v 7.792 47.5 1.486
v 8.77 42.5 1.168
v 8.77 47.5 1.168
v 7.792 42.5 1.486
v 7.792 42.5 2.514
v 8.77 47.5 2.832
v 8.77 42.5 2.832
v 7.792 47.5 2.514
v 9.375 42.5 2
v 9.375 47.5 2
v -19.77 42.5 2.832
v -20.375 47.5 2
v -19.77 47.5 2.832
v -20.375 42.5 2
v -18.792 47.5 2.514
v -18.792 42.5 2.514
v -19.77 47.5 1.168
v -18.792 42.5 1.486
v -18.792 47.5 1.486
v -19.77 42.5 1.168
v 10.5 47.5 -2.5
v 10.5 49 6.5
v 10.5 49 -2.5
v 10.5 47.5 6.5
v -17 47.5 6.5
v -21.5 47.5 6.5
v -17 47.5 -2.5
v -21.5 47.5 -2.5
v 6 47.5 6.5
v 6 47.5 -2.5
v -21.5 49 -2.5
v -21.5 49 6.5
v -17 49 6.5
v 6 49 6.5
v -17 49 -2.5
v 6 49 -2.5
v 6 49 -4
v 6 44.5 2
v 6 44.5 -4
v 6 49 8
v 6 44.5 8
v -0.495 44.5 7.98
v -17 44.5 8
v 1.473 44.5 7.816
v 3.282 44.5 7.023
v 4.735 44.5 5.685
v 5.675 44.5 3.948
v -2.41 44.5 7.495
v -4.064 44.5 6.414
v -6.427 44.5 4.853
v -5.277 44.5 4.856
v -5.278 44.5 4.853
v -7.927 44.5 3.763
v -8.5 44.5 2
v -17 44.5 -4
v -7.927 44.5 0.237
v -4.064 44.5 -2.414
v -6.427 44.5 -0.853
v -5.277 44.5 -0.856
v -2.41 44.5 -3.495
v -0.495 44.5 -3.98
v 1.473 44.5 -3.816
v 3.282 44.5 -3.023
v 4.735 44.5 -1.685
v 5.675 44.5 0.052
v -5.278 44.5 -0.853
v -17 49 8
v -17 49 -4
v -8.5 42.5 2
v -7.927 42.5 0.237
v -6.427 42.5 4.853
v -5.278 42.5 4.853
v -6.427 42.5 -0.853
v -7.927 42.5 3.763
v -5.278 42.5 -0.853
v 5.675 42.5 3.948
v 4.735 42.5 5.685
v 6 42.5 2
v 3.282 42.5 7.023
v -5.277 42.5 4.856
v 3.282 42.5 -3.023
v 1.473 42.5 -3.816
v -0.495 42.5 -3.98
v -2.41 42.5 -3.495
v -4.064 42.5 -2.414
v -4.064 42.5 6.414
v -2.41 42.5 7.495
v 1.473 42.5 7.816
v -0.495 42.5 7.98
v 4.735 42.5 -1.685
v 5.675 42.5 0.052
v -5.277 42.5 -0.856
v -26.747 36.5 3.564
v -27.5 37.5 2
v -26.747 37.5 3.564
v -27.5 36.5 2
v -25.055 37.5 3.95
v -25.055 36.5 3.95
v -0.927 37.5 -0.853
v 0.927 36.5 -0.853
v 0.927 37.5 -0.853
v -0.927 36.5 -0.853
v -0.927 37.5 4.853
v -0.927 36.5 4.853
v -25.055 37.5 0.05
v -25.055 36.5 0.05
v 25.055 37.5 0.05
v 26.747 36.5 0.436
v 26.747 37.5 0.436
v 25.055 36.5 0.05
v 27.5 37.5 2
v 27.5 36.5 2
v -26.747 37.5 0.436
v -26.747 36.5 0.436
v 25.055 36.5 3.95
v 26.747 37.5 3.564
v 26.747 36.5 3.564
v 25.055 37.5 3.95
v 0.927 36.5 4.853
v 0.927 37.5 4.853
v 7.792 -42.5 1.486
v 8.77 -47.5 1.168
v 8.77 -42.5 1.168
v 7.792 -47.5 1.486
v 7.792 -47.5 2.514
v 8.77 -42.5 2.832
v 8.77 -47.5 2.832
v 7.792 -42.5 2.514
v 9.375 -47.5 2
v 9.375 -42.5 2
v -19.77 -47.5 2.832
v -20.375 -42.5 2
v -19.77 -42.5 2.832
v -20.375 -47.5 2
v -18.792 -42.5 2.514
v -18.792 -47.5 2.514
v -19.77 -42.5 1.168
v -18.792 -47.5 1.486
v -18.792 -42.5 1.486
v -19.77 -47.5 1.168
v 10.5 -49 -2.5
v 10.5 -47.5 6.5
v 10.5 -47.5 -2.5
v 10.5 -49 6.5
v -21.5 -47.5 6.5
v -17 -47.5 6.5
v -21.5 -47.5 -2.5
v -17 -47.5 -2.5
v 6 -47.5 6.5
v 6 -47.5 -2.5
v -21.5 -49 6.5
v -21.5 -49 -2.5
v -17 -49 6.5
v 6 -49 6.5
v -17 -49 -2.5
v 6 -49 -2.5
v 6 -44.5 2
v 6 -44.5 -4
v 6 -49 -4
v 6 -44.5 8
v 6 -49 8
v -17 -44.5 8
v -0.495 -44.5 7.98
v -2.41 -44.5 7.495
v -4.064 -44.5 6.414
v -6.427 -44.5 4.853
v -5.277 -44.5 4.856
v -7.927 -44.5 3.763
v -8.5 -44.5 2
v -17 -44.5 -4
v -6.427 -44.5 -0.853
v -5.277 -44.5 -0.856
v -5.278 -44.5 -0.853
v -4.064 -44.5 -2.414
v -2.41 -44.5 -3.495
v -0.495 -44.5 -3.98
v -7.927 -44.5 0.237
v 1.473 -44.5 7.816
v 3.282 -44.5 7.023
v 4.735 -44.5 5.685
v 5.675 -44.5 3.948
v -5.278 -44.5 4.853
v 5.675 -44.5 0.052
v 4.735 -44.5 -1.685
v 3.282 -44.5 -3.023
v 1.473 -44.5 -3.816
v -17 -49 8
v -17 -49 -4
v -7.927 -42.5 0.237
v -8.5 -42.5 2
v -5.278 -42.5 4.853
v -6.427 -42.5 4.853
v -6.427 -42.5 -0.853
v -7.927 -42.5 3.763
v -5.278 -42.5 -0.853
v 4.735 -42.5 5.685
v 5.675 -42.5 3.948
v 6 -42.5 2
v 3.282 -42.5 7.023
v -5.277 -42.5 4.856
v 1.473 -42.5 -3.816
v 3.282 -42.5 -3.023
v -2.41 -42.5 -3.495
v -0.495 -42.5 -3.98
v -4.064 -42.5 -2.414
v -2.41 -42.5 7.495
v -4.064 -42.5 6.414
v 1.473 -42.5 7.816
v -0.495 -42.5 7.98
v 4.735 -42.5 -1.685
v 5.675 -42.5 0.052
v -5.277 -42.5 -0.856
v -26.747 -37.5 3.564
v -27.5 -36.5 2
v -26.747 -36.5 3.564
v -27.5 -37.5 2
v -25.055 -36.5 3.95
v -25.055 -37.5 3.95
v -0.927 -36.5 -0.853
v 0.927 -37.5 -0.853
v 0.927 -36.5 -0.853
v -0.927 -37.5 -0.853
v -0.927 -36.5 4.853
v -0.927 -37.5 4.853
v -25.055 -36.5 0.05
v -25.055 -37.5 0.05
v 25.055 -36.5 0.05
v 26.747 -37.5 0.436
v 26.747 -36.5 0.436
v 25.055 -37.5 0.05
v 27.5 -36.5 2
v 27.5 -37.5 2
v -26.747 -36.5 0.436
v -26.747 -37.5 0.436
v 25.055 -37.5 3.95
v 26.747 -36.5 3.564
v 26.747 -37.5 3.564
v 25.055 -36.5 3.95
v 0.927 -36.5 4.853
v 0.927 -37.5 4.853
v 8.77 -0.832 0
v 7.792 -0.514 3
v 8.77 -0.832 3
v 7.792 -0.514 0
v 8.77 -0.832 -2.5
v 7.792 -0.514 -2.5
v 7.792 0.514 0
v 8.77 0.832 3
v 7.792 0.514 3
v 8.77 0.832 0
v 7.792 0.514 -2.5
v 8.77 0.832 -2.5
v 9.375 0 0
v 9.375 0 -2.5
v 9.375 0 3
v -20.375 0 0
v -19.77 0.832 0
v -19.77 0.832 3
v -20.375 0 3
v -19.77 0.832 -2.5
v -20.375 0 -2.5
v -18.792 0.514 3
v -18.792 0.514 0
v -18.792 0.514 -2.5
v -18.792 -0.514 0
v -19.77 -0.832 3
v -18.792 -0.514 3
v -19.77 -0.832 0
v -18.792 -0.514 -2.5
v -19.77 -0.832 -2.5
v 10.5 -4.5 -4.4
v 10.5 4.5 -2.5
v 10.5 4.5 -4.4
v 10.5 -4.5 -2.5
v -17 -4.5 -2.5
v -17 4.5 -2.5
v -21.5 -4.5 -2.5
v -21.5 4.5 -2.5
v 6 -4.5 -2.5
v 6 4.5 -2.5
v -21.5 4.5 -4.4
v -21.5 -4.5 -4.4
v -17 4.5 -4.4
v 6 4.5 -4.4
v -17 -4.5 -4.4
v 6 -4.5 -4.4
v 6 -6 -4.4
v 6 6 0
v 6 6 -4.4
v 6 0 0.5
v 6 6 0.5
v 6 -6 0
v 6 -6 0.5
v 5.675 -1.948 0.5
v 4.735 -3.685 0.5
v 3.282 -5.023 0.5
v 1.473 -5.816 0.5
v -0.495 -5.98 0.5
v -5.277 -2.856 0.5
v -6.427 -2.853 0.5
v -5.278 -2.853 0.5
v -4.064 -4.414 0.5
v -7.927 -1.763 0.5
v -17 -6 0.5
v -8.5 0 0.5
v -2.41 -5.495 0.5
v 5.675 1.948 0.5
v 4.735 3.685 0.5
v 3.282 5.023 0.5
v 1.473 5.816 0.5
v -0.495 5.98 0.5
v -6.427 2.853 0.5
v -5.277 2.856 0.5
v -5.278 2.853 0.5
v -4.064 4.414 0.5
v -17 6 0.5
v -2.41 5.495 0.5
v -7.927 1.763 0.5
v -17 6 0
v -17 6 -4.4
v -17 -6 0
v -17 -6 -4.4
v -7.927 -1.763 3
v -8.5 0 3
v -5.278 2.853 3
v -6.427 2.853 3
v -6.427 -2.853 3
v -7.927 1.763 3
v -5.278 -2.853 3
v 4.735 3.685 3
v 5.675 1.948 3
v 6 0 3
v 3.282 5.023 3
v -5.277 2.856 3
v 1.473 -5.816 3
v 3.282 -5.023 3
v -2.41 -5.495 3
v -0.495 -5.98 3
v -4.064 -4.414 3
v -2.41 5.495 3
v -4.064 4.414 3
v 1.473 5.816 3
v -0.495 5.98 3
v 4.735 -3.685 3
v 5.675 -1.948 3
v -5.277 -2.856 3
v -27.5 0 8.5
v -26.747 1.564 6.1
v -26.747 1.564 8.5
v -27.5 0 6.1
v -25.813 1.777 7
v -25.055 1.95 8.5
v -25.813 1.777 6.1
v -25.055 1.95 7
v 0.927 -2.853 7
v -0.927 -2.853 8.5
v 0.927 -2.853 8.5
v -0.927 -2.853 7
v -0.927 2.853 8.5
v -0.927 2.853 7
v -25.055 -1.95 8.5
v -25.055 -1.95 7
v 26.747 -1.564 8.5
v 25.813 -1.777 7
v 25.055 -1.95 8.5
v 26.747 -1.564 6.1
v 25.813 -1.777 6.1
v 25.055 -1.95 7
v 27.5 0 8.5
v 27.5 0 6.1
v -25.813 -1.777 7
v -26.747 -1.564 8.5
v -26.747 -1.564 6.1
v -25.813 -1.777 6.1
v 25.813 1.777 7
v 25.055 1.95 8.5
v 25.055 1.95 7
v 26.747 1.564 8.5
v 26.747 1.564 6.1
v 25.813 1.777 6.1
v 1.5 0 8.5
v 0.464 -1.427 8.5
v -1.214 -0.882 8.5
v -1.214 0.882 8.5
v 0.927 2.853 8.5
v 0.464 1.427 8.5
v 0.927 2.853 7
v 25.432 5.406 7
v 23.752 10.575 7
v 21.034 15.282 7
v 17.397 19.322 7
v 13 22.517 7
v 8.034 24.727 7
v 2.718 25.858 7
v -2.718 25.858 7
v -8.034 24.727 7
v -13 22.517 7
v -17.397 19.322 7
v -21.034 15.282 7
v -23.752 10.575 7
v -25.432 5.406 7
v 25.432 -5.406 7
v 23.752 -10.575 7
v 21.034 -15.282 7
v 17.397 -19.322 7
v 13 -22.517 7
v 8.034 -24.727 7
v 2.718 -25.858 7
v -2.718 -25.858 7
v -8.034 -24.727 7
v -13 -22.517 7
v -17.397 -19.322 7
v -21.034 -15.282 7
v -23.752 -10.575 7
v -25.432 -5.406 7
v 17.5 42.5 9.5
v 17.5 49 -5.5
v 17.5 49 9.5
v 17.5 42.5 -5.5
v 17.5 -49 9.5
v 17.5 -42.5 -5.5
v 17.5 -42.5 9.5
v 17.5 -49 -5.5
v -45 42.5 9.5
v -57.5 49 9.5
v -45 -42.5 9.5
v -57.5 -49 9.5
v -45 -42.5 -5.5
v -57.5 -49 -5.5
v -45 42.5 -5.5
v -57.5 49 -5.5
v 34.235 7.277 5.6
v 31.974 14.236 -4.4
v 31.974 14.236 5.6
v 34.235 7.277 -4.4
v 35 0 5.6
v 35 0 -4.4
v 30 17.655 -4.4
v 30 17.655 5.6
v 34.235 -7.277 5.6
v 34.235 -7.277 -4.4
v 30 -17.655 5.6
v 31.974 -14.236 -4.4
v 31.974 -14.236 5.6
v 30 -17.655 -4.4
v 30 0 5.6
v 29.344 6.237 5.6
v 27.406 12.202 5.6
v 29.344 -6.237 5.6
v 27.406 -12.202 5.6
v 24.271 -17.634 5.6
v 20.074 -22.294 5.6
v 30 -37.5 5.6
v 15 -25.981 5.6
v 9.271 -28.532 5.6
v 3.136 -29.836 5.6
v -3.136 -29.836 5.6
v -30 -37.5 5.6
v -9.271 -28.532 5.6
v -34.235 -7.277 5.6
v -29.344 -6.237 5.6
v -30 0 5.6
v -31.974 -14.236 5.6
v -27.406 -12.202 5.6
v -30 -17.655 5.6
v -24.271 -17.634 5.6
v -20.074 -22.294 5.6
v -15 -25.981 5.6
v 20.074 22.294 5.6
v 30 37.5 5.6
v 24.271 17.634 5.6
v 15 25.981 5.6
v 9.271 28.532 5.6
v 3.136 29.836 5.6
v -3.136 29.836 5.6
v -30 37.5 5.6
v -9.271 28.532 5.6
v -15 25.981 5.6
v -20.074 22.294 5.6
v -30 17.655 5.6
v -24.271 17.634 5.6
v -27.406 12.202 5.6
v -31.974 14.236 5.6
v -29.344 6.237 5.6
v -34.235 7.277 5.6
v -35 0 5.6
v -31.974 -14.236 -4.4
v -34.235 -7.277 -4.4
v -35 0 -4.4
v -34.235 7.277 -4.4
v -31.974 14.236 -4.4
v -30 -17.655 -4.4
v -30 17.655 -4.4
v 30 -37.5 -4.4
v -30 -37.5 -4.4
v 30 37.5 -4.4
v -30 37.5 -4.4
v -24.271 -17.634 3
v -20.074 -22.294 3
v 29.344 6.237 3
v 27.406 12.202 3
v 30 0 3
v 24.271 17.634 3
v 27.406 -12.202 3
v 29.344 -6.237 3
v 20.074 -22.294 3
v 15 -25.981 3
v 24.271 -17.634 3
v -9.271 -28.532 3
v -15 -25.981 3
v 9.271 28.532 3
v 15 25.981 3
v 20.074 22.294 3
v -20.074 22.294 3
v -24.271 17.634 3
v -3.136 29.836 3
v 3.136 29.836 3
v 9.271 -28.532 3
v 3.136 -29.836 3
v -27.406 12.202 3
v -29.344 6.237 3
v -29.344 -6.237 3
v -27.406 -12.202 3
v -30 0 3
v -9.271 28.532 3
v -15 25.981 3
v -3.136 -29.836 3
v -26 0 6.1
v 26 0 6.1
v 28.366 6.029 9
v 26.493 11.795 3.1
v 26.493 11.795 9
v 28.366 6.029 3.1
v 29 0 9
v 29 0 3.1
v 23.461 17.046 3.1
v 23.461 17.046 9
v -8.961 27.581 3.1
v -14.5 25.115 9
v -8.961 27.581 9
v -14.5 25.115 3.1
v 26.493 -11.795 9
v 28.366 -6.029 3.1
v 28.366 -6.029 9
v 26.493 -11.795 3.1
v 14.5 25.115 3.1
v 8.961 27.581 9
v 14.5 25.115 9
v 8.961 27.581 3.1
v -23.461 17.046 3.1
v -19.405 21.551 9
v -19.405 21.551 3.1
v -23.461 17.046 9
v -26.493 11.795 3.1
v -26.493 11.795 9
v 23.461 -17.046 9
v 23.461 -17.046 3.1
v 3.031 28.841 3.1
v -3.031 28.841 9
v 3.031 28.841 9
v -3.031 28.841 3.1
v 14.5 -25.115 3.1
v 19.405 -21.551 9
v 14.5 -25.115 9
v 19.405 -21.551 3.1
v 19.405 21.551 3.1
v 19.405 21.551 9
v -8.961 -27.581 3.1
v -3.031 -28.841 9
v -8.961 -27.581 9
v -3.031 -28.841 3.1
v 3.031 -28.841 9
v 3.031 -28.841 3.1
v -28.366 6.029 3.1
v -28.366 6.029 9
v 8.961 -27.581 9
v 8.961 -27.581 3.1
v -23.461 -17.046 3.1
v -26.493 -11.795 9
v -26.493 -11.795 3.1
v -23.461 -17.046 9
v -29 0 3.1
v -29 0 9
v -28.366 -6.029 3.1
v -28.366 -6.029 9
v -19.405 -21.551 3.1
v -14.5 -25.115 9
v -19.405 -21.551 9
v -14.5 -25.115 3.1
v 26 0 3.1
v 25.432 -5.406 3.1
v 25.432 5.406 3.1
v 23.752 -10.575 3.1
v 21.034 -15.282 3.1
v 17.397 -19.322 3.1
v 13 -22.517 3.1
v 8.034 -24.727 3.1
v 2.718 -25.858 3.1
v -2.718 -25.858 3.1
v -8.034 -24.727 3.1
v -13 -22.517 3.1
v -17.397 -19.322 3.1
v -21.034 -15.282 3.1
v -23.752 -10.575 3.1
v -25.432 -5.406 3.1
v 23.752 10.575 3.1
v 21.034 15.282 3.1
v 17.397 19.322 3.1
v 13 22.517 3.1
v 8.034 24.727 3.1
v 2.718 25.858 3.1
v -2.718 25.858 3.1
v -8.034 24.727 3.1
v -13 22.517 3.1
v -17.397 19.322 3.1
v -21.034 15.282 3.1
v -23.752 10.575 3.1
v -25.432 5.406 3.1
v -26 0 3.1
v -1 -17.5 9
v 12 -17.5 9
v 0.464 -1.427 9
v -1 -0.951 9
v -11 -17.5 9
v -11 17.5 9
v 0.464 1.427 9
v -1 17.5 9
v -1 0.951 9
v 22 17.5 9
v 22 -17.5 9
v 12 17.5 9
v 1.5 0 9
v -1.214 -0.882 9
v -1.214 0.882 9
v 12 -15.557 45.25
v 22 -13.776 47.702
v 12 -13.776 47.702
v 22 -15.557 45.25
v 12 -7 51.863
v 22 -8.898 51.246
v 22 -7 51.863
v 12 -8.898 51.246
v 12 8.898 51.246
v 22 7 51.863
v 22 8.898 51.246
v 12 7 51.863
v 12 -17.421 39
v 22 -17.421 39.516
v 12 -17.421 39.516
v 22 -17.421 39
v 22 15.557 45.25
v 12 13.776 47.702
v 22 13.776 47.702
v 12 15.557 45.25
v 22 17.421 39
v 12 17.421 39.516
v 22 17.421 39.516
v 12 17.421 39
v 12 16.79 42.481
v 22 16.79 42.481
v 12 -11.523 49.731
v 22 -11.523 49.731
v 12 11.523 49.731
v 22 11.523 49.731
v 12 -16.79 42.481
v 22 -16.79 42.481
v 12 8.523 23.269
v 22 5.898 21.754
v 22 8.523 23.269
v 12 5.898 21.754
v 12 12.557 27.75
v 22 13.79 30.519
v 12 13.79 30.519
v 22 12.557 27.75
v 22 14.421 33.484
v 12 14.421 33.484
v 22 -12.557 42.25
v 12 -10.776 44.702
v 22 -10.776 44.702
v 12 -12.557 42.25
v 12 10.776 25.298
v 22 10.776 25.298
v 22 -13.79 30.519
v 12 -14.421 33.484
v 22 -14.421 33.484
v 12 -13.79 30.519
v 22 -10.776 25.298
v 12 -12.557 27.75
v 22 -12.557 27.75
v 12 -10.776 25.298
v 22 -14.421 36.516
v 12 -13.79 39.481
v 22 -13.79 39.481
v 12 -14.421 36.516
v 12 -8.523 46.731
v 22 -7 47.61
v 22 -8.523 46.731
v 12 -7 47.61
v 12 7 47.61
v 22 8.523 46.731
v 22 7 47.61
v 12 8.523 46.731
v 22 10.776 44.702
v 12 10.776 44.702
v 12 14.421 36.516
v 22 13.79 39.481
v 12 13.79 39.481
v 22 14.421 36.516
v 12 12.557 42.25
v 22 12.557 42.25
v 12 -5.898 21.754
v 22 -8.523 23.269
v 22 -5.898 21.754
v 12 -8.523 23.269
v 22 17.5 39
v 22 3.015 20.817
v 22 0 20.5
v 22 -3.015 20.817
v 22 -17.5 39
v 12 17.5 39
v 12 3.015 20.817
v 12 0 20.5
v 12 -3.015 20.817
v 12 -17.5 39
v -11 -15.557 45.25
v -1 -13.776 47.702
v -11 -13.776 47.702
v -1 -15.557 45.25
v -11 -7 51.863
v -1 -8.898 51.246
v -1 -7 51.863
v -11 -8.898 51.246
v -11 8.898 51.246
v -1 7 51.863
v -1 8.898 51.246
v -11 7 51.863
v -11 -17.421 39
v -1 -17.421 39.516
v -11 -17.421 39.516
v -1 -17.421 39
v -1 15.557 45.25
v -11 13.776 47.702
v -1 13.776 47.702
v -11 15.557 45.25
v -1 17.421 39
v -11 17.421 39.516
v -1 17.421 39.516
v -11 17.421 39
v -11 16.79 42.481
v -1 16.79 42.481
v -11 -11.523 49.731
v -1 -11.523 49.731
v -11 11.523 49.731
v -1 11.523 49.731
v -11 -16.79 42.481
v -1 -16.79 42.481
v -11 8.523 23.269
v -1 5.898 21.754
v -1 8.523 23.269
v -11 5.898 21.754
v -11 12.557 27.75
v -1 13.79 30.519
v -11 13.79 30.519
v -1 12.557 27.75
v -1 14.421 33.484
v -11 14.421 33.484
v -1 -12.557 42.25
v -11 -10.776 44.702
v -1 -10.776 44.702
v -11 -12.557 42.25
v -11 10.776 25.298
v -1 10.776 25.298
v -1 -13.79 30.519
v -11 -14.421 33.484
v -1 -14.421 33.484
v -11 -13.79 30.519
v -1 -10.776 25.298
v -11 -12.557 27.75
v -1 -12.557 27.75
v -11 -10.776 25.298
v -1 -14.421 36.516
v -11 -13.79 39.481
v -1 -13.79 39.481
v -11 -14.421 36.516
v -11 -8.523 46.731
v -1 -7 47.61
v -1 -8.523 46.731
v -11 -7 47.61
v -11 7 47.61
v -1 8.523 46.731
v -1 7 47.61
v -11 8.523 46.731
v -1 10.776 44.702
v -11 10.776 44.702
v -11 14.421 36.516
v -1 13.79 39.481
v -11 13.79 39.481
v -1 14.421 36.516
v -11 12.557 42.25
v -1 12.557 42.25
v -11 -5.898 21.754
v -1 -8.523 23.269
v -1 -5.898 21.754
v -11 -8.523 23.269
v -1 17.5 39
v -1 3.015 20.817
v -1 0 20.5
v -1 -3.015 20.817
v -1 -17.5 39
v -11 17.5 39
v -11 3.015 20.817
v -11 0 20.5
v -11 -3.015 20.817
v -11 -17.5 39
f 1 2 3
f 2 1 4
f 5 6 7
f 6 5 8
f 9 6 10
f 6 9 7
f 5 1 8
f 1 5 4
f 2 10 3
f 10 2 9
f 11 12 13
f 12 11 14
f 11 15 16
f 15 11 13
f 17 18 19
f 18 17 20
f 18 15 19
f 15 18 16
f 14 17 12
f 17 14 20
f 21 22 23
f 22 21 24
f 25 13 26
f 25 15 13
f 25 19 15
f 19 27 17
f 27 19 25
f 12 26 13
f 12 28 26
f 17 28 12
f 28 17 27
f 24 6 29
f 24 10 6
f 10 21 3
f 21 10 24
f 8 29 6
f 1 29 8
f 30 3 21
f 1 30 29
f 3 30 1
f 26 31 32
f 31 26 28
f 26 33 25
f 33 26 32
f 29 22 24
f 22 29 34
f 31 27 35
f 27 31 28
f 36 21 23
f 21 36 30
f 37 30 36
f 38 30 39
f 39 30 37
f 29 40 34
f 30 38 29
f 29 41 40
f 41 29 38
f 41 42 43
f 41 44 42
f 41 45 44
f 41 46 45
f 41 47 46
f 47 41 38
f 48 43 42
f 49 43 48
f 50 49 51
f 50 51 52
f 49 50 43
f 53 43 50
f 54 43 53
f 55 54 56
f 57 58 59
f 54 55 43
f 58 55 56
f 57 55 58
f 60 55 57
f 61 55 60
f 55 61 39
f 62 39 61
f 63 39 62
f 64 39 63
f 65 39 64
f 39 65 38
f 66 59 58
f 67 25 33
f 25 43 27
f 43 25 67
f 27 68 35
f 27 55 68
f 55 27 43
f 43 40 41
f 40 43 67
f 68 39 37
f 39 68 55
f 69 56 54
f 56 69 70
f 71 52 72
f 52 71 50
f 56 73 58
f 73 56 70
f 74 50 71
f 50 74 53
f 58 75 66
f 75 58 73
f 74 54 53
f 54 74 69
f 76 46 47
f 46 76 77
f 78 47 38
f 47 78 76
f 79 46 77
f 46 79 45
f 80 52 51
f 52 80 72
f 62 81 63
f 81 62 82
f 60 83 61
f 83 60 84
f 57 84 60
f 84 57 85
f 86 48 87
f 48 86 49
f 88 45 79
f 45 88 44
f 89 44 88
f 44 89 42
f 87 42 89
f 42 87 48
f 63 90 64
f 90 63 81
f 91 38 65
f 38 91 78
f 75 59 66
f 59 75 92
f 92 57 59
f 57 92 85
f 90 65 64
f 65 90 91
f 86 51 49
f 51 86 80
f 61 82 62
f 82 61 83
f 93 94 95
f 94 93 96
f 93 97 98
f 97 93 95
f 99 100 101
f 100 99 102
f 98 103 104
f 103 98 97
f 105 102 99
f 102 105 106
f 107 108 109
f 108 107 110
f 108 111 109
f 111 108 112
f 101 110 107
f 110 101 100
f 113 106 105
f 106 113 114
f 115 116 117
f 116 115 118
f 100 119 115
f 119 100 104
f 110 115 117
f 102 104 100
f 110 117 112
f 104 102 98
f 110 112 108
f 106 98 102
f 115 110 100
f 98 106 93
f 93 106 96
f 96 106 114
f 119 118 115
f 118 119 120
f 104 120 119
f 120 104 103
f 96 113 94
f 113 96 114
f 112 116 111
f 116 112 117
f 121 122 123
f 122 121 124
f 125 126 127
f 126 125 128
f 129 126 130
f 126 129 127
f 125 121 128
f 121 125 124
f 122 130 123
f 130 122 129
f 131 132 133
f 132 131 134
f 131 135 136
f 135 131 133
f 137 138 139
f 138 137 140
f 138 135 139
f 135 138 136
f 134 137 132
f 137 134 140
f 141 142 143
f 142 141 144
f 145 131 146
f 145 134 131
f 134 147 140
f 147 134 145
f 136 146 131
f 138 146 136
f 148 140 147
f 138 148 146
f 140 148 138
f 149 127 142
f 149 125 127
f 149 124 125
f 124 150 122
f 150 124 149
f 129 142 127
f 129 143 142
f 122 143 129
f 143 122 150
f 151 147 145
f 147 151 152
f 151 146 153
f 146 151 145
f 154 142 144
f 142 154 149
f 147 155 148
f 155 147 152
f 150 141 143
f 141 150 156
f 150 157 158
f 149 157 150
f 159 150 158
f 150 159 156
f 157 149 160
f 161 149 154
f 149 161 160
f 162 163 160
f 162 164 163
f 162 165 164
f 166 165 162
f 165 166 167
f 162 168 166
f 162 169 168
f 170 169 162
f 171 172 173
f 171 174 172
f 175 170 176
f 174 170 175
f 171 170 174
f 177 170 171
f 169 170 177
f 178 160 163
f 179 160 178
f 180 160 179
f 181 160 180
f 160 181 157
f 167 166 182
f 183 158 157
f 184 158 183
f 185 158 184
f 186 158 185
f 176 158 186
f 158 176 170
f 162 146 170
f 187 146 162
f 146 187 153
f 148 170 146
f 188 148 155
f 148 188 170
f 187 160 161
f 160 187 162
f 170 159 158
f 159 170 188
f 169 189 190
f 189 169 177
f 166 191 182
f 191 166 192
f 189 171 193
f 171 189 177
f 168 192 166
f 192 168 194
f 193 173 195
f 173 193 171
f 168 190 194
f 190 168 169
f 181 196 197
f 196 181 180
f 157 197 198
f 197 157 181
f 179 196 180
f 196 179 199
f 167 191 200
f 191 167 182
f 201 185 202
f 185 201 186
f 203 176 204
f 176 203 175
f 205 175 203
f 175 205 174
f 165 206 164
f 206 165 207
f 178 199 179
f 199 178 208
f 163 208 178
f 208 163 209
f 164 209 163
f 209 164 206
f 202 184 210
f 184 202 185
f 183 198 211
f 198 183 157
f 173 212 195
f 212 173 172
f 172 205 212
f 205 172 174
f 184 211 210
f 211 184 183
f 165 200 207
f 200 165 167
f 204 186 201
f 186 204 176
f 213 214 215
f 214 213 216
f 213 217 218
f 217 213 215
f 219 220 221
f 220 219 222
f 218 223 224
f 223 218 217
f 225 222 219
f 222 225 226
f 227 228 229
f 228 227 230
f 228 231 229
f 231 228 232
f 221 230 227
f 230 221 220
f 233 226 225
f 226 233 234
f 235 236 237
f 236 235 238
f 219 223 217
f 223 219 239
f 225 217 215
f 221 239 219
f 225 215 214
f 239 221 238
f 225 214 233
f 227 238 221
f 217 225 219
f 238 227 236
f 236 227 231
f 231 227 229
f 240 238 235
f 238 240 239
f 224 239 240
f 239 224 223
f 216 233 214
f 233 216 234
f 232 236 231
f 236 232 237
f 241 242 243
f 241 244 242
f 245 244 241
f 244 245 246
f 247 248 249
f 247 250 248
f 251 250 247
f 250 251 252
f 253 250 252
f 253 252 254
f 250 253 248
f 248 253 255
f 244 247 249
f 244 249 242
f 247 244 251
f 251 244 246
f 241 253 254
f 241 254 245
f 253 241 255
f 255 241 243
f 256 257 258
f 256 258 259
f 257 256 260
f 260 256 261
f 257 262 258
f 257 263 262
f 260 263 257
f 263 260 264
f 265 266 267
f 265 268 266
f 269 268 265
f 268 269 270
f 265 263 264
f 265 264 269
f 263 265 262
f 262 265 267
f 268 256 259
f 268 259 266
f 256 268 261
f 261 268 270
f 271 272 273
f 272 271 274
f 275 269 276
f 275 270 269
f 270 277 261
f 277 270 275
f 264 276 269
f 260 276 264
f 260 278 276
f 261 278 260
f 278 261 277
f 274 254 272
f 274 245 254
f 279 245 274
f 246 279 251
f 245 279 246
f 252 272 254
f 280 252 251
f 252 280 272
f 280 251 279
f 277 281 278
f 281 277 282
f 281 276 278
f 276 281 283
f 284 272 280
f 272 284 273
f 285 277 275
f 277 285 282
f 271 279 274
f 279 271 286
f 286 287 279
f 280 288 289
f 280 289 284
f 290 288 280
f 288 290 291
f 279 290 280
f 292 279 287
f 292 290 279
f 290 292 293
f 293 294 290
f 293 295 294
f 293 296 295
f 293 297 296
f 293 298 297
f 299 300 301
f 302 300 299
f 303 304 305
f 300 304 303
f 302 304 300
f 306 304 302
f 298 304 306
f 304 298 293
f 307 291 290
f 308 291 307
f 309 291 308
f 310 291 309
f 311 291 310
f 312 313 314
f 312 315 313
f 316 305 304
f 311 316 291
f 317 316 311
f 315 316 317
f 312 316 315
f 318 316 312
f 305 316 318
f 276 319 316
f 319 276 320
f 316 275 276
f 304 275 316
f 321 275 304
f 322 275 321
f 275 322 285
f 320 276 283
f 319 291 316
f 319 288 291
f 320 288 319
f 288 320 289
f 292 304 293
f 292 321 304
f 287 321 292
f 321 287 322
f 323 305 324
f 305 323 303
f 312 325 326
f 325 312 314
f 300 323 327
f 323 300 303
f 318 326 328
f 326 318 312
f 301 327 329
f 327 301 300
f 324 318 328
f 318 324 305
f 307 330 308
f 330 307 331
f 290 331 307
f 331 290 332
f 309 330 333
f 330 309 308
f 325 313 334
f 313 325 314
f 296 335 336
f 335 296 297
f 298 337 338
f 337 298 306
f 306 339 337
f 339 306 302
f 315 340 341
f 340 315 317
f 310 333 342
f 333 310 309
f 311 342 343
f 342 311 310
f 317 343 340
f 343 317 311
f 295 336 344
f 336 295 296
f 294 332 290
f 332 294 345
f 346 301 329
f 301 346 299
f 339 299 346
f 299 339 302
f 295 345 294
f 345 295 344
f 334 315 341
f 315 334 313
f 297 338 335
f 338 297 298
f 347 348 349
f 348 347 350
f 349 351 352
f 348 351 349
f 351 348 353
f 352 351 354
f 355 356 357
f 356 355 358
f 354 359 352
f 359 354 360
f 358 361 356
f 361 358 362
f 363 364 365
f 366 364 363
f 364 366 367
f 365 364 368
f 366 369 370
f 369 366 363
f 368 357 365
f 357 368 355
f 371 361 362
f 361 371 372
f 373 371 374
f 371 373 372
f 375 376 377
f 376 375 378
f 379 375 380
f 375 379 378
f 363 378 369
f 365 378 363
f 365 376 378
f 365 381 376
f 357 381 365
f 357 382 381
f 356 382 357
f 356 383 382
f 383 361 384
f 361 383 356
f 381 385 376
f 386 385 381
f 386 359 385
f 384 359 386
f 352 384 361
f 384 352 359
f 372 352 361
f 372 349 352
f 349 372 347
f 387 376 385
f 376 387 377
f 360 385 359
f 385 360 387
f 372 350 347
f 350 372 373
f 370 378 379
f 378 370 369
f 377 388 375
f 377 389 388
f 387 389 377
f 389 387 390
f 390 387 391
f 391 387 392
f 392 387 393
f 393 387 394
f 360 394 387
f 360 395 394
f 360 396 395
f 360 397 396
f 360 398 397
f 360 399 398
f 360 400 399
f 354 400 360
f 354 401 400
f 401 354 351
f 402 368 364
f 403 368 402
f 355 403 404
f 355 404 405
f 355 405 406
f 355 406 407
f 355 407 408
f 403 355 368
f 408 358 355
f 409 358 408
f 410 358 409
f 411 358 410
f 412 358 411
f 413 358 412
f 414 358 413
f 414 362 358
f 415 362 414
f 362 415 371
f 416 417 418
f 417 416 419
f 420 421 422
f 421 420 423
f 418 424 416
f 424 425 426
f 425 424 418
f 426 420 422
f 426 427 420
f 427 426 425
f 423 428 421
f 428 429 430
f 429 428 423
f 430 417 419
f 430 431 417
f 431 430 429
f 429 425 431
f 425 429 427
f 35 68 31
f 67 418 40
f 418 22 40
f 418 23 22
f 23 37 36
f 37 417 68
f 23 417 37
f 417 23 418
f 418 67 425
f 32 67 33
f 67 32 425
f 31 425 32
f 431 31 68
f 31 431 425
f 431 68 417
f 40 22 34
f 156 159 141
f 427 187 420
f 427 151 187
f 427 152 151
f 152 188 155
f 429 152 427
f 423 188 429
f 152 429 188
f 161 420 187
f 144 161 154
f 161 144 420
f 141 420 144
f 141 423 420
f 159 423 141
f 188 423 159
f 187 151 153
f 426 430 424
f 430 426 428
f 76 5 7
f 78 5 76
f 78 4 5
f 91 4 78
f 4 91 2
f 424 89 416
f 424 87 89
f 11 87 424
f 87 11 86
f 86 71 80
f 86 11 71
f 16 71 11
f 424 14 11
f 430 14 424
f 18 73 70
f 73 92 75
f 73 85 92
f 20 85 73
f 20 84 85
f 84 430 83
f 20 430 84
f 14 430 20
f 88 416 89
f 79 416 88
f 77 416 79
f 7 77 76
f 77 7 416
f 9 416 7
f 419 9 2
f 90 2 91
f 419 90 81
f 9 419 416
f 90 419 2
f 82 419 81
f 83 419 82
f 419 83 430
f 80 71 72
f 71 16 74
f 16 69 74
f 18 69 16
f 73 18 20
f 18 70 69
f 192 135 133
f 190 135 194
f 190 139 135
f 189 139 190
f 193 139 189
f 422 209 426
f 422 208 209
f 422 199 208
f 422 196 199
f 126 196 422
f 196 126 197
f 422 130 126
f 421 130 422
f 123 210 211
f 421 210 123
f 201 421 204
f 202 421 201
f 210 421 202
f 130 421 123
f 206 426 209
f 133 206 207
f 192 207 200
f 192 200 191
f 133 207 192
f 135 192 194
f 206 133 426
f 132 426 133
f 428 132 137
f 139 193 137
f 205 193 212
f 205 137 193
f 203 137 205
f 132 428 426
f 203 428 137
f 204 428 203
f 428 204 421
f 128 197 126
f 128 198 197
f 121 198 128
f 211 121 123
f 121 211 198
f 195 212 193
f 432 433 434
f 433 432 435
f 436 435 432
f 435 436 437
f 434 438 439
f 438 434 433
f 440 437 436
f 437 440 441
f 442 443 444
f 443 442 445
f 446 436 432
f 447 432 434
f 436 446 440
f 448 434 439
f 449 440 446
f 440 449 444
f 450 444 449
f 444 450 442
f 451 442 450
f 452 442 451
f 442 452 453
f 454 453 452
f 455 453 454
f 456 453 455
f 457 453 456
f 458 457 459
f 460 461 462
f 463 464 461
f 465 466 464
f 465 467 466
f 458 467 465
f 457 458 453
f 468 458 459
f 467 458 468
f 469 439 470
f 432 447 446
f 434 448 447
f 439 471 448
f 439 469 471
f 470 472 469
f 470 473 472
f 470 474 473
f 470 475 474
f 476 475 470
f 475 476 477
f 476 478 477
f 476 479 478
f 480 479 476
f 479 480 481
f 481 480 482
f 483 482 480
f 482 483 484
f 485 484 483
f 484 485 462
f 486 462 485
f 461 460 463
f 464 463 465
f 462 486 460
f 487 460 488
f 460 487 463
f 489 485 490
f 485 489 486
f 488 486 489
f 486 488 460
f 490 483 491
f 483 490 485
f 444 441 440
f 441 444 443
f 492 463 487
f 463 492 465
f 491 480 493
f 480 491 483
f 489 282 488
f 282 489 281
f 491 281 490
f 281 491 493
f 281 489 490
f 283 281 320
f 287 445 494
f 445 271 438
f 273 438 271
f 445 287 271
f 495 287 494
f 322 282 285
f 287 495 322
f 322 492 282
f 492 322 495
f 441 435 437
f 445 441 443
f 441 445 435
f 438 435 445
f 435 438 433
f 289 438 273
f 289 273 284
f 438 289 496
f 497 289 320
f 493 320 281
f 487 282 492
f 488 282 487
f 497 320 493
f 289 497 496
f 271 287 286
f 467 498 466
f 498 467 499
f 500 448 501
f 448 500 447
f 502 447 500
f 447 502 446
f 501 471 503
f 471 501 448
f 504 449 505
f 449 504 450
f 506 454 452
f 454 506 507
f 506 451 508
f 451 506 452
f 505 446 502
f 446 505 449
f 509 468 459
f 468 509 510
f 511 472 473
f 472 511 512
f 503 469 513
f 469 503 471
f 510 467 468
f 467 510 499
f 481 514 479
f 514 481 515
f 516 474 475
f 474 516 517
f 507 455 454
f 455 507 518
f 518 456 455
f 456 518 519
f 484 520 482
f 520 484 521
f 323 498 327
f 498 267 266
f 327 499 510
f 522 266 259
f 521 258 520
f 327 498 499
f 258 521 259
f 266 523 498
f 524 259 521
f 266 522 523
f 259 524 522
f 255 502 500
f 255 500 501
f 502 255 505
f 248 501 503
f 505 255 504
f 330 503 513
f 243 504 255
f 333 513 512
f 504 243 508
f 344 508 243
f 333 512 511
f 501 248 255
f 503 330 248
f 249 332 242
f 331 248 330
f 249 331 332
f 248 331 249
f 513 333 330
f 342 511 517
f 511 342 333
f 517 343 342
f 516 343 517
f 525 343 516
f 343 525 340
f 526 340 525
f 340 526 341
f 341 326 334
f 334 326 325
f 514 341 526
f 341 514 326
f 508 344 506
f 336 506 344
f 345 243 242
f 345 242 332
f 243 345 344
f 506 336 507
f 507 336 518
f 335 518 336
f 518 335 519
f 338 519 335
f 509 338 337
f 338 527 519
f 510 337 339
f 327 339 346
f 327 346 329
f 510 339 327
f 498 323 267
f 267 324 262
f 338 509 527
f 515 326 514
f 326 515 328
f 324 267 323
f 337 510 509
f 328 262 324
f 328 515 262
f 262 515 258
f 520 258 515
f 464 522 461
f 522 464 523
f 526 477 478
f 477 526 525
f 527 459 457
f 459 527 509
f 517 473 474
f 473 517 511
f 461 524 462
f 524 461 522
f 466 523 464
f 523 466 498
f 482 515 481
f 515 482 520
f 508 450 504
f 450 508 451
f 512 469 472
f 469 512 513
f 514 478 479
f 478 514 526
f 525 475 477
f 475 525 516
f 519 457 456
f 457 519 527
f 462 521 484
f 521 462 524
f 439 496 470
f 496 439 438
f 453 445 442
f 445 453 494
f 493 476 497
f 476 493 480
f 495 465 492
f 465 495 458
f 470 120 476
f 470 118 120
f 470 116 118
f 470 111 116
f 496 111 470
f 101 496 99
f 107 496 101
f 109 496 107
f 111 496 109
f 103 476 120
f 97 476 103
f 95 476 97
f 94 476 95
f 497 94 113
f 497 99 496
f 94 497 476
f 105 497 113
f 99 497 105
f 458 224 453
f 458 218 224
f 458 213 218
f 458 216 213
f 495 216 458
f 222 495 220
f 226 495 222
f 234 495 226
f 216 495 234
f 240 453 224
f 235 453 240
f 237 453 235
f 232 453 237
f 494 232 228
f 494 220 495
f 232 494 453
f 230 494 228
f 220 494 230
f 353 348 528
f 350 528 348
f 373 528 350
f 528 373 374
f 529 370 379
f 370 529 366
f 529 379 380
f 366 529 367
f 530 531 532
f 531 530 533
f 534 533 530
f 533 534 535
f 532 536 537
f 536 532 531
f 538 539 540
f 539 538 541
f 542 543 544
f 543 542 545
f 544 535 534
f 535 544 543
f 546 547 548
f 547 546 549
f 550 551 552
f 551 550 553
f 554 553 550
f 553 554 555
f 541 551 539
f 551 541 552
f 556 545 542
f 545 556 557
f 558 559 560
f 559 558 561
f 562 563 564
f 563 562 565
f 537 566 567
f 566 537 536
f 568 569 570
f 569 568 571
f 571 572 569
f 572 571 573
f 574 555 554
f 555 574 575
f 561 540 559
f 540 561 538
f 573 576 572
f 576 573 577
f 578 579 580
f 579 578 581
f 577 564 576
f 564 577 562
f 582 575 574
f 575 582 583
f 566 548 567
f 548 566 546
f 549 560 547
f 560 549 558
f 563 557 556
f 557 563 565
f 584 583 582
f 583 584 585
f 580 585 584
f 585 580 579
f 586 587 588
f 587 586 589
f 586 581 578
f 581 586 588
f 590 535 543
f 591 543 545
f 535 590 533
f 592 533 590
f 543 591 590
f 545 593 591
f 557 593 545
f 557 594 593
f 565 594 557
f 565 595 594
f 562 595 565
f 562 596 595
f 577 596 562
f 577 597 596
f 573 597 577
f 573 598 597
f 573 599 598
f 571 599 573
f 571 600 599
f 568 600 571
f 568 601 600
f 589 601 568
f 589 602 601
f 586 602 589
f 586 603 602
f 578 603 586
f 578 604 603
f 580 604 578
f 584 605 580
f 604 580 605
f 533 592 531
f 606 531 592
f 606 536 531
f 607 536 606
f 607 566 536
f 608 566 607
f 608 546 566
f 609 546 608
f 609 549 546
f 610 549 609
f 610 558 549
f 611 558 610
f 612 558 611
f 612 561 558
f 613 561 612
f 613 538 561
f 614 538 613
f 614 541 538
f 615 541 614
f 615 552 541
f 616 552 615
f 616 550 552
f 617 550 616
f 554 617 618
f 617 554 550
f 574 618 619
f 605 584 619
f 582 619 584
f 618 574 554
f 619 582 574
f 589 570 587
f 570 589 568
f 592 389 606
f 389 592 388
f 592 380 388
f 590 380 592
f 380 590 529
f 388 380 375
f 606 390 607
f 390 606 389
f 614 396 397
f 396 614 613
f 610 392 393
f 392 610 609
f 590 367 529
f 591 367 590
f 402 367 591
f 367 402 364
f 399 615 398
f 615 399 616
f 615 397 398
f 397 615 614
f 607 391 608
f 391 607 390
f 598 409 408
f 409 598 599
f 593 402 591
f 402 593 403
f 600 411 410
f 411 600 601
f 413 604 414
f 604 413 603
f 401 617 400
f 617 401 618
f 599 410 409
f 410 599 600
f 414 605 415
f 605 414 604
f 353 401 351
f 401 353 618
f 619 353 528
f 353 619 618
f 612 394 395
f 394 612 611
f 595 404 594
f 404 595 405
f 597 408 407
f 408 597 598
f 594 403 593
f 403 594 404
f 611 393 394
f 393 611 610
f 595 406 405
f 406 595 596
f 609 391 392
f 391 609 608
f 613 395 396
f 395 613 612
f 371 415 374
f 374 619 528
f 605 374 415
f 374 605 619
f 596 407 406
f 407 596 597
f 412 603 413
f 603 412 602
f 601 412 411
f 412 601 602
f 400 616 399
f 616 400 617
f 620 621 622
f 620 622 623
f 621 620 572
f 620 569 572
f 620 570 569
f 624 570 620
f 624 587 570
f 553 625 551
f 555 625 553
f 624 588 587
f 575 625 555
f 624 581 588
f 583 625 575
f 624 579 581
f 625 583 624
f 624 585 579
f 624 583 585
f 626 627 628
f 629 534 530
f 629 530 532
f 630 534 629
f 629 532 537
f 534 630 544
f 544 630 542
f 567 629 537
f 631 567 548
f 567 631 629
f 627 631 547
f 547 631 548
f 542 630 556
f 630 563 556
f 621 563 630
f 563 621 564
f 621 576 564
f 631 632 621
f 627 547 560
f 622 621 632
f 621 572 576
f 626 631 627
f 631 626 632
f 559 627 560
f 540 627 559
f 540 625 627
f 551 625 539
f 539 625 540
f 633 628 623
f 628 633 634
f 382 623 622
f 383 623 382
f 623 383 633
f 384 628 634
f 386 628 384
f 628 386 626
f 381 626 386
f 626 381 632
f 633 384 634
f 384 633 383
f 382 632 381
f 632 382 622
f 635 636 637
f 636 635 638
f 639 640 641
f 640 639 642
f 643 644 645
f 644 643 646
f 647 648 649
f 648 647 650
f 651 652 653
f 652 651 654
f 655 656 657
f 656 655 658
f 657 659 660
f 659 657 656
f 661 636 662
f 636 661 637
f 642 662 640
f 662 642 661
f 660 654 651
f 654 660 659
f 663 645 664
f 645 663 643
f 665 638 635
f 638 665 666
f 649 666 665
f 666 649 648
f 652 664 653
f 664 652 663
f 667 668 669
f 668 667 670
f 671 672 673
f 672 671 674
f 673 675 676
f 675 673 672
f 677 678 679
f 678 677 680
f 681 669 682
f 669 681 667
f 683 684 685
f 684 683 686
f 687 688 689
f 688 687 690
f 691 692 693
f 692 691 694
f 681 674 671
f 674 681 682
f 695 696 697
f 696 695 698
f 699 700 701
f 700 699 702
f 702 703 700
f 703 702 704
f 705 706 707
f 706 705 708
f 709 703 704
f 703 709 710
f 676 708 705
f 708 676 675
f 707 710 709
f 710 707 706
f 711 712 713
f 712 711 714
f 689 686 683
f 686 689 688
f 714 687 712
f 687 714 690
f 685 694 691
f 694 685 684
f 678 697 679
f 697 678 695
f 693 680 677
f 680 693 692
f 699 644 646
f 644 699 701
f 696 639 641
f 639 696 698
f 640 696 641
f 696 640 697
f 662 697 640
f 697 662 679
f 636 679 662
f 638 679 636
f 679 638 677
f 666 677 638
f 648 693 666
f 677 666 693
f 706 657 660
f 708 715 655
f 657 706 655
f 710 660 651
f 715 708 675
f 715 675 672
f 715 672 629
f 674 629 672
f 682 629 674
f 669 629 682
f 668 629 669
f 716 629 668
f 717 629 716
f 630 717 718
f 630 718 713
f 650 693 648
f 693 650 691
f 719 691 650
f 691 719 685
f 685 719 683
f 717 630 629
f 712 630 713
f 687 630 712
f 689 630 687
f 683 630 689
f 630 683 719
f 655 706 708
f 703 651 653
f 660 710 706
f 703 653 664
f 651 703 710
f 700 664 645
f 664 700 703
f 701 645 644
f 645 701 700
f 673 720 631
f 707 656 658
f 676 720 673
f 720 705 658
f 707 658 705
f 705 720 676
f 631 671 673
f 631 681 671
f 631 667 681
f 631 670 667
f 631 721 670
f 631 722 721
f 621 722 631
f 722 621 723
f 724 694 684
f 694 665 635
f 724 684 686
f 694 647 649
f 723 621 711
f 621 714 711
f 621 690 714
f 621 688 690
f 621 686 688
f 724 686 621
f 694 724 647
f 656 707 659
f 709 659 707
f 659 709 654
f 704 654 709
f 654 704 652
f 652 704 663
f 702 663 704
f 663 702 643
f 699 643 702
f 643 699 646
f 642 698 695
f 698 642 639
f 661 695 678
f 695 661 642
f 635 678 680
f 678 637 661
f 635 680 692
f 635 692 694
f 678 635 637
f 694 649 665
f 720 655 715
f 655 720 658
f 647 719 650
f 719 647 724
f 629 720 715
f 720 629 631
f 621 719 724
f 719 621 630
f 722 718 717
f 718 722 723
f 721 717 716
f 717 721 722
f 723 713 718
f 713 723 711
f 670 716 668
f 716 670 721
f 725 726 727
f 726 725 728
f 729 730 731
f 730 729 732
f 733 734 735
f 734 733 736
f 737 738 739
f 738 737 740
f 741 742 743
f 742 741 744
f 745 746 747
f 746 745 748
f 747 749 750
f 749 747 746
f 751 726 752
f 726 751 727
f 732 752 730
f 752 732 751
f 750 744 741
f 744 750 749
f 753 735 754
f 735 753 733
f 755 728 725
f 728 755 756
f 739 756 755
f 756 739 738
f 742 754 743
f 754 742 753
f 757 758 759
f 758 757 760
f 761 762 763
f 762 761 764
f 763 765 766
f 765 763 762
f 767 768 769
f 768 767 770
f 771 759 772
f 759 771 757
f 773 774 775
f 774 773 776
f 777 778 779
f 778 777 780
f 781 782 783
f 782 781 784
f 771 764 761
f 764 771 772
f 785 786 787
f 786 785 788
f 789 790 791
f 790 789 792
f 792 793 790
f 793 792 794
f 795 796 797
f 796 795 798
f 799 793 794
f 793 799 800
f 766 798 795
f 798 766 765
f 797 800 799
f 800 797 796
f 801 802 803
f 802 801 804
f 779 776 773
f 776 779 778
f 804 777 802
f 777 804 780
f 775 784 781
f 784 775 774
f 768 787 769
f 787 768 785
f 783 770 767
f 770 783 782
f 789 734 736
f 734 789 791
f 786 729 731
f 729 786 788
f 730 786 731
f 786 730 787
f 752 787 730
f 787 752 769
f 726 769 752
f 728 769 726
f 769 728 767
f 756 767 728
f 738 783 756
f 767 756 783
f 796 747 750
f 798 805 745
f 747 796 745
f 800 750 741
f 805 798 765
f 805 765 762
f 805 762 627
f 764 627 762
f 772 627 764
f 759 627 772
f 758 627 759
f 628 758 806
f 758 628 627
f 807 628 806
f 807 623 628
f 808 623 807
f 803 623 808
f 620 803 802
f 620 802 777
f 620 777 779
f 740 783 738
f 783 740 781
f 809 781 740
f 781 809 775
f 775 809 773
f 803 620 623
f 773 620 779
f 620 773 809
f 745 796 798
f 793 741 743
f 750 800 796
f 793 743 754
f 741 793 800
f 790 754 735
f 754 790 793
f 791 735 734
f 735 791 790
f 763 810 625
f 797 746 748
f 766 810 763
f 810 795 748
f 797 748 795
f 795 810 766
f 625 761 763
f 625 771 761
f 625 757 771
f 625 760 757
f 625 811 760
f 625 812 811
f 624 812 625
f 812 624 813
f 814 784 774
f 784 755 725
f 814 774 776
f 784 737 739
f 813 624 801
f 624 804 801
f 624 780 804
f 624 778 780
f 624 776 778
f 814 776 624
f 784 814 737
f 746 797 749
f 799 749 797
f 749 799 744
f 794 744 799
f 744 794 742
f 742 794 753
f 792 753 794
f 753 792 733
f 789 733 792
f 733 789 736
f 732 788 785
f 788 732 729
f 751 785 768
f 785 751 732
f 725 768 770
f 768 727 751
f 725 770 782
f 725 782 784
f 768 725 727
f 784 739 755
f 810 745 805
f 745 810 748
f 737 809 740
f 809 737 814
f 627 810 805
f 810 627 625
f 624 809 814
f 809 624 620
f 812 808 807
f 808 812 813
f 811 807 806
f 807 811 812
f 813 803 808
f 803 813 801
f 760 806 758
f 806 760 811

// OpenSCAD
// file: utils.scad
module clone_mirror(axis) {
    children();
    mirror(axis)
    children();
}

module clone_translate(axis) {
    children();
    translate(axis)
    children();
}
// file: servo_utils.scad
use <utils.scad>

$servo_draglift_offset = 5.5;

function get_servo_draglift_offset() = $servo_draglift_offset;

module draglift() {
    color("white") {
        hull() {
            cylinder(1.5,3,3);
            clone_mirror([1,0,0]) translate([25.5,0,0]) cylinder(1.5,2,2);
        }
        mirror([0,0,1]) cylinder(2.5,3,3);
    }
}

module draglift_holder() {
    difference() {
        union() {
            cube([30, 5, 2]);
            clone_mirror([1,0,0]) clone_mirror([0,1,0])
                cube([30, 5, 2]);
        }
        draglift();
    }
}

module draglift_holder_aligned_to_servo() {
    translate([$servo_draglift_offset,0,17]) draglift_holder();
}

//draglift_holder();

module servo_screws() {
    color("gray") clone_mirror([1,0,0]) translate([14,0,6]) 
        cylinder(20,1.75/2,1.75/2, center=true);
}
servo_screws();

module servo(draw_draglift=true, draglift_angle=0) {
    color("blue") {
        cube([23,12,21], center=true);
        difference() {
            translate([0,0,6.5]) cube([32,9,2], center=true);
            servo_screws();
        }
        translate([0,0,10.5]) cylinder(3.5, 3, 3);
        translate([0,0,14]) cylinder(1,1,1);
    }
    translate([$servo_draglift_offset,0,10.5]) {
        color("blue") cylinder(3.5,6,6);
        color("white") cylinder(6,1.8,1.8);
    }
    if (draw_draglift)
        translate([$servo_draglift_offset,0,17]) rotate([0,0,draglift_angle]) draglift();
}

servo();
// main file
use <servo_utils.scad>;
use <utils.scad>

module camera_holder_servos() {
    clone_mirror([0,1,0]) 
        translate([-get_servo_draglift_offset(),55,2]) 
        rotate([90,0,0]) {
            servo(true, 0);            
            servo_screws();
        }
    translate([-get_servo_draglift_offset(),0,-10]) {
        servo();
        servo_screws();
    }
}

module camera_holder_sides() {
    difference() {
        translate([-20,0,2]) 
            cube([75,98,15], center=true);
        
        cube([90,85,30], center=true);
        camera_holder_servos();
    }
} 
camera_holder_sides();

module camera_holder_low() {
    difference() {
        union() {
            translate([0,0,-4.4]) cylinder(10,35,35);
            translate([-get_servo_draglift_offset(),0,-1.9]) 
                cube([35,15,5], center=true);
        }
        translate([0,0,3]) cylinder(3.1,30,30);    
        camera_holder_servos();
    }
    
    difference() {
        translate([0,0,0.6]) cube([60,75,10], center=true);
        cylinder(6,35,35);
        camera_holder_servos();
    }
}
camera_holder_low();

module camera_holder_up() {
    
    translate([0,0,3.1]) difference() {
        cylinder(6-0.1,29,29);
        translate([0,0,-0.1]) cylinder(7,26,26);                
        translate([0,0,4]) draglift();  
        translate([0,0,3]) draglift();  
    }
    difference() {
        translate([0,0,7]) cylinder(2,29,29);
        cylinder(50,1.5,1.5);
        camera_holder_servos();        
        translate([0,0,6]) draglift();
    }
    
    clone_translate([-23,0,0]) {
        intersection() {
            translate([17,0,34]) 
                cube([10,35,50], center=true);
            difference() {
                minkowski() {
                    camera();
                    cube(6, center=true);
                }
                camera();                
                cube([100,14,200], center=true);
            }
        }          
        difference() {
            translate([17,0,24]) cube([10,35,30], center=true);
            camera();
        }
    }
    
}
camera_holder_up();


module camera() {
    translate([15,0,35]) rotate([0,90,0]) 
        cylinder(55,29/2,29/2, center=true);
}
if ($preview) {
    color("gray", 0.7) camera();
    camera_holder_servos();
}

module camera_holder(servos=true) {
    if (servos)
        camera_holder_servos();
    camera_holder_sides();
    camera_holder_low();
    camera_holder_up();
}
